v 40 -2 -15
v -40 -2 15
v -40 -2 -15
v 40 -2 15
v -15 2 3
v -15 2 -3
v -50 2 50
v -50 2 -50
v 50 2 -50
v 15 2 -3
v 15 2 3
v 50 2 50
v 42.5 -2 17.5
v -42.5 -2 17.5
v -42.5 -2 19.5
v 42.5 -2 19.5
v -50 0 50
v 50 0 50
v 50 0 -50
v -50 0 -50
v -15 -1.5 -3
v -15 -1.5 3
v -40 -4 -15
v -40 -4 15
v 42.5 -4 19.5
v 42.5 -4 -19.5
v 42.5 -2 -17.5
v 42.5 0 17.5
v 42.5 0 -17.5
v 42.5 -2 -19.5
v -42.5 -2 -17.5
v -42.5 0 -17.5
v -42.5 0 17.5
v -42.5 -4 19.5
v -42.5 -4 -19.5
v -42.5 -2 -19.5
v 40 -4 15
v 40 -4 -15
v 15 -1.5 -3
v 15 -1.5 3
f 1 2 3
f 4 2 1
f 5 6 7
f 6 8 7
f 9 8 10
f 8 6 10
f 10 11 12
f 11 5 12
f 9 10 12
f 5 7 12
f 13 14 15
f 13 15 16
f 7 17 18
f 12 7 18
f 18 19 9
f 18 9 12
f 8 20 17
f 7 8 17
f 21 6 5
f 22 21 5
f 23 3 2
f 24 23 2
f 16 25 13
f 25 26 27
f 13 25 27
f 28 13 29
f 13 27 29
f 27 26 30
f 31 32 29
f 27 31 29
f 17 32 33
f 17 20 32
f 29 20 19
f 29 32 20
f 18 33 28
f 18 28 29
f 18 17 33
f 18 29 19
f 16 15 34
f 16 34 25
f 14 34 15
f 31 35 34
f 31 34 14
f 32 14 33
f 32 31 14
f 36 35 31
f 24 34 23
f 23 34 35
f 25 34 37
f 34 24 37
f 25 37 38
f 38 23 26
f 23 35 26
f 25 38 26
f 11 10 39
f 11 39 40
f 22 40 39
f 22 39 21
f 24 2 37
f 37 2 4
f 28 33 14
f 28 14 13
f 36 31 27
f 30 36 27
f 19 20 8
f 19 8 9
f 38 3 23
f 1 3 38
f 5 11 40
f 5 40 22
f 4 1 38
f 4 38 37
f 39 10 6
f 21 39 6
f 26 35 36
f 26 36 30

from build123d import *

# Parameters (mm, degrees)
F0_W     = 100
F0_H     = 100
F0_W_2   = 85
F0_H_2   = 35
F0_W_3   = 80
F0_H_3   = 30
F1_DEPTH = 2
F2_DEPTH = 4
F3_W     = 85
F3_H     = 2
F4_DEPTH = 2
F5_W     = 85
F5_H     = 2
F6_DEPTH = 2
F7_DEPTH = 2
F8_W     = 30
F8_H     = 6
F9_DEPTH = 3.5


with BuildPart() as f1:
    # F0 (on Front) → F1 (new body)
    with BuildSketch(Plane.XZ):
        Rectangle(F0_W, F0_H)
        Rectangle(F0_W_2, F0_H_2, mode=Mode.SUBTRACT)
        Rectangle(F0_W_2, F0_H_2)
        Rectangle(F0_W_3, F0_H_3, mode=Mode.SUBTRACT)
        Rectangle(F0_W_3, F0_H_3)
    extrude(amount=-F1_DEPTH)

    # F0 (on Front) → F2 (join)
    with BuildSketch(Plane.XZ):
        Rectangle(F0_W_2, F0_H_2)
        Rectangle(F0_W_3, F0_H_3, mode=Mode.SUBTRACT)
    extrude(amount=F2_DEPTH)

    # F3 (on face) → F4 (join)
    with BuildSketch(Plane(origin=(0, 0, -17.5), x_dir=(1, 0, 0), z_dir=(0, 0, -1))):
        with Locations((0, 3)):
            Rectangle(F3_W, F3_H)
    extrude(amount=F4_DEPTH)

    # F5 (on face) → F6 (join)
    with BuildSketch(Plane.XY.offset(17.5)):
        with Locations((0, -3)):
            Rectangle(F5_W, F5_H)
    extrude(amount=F6_DEPTH)

    # F0 (on Front) → F7 (join)
    with BuildSketch(Plane.XZ):
        Rectangle(F0_W_3, F0_H_3)
    extrude(amount=F7_DEPTH)

    # F8 (on face) → F9 (cut)
    with BuildSketch(Plane(origin=(0, 2, 0), x_dir=(-1, 0, 0), z_dir=(0, 1, 0))):
        Rectangle(F8_W, F8_H)
    extrude(amount=-F9_DEPTH, mode=Mode.SUBTRACT)


solid = f1.part
